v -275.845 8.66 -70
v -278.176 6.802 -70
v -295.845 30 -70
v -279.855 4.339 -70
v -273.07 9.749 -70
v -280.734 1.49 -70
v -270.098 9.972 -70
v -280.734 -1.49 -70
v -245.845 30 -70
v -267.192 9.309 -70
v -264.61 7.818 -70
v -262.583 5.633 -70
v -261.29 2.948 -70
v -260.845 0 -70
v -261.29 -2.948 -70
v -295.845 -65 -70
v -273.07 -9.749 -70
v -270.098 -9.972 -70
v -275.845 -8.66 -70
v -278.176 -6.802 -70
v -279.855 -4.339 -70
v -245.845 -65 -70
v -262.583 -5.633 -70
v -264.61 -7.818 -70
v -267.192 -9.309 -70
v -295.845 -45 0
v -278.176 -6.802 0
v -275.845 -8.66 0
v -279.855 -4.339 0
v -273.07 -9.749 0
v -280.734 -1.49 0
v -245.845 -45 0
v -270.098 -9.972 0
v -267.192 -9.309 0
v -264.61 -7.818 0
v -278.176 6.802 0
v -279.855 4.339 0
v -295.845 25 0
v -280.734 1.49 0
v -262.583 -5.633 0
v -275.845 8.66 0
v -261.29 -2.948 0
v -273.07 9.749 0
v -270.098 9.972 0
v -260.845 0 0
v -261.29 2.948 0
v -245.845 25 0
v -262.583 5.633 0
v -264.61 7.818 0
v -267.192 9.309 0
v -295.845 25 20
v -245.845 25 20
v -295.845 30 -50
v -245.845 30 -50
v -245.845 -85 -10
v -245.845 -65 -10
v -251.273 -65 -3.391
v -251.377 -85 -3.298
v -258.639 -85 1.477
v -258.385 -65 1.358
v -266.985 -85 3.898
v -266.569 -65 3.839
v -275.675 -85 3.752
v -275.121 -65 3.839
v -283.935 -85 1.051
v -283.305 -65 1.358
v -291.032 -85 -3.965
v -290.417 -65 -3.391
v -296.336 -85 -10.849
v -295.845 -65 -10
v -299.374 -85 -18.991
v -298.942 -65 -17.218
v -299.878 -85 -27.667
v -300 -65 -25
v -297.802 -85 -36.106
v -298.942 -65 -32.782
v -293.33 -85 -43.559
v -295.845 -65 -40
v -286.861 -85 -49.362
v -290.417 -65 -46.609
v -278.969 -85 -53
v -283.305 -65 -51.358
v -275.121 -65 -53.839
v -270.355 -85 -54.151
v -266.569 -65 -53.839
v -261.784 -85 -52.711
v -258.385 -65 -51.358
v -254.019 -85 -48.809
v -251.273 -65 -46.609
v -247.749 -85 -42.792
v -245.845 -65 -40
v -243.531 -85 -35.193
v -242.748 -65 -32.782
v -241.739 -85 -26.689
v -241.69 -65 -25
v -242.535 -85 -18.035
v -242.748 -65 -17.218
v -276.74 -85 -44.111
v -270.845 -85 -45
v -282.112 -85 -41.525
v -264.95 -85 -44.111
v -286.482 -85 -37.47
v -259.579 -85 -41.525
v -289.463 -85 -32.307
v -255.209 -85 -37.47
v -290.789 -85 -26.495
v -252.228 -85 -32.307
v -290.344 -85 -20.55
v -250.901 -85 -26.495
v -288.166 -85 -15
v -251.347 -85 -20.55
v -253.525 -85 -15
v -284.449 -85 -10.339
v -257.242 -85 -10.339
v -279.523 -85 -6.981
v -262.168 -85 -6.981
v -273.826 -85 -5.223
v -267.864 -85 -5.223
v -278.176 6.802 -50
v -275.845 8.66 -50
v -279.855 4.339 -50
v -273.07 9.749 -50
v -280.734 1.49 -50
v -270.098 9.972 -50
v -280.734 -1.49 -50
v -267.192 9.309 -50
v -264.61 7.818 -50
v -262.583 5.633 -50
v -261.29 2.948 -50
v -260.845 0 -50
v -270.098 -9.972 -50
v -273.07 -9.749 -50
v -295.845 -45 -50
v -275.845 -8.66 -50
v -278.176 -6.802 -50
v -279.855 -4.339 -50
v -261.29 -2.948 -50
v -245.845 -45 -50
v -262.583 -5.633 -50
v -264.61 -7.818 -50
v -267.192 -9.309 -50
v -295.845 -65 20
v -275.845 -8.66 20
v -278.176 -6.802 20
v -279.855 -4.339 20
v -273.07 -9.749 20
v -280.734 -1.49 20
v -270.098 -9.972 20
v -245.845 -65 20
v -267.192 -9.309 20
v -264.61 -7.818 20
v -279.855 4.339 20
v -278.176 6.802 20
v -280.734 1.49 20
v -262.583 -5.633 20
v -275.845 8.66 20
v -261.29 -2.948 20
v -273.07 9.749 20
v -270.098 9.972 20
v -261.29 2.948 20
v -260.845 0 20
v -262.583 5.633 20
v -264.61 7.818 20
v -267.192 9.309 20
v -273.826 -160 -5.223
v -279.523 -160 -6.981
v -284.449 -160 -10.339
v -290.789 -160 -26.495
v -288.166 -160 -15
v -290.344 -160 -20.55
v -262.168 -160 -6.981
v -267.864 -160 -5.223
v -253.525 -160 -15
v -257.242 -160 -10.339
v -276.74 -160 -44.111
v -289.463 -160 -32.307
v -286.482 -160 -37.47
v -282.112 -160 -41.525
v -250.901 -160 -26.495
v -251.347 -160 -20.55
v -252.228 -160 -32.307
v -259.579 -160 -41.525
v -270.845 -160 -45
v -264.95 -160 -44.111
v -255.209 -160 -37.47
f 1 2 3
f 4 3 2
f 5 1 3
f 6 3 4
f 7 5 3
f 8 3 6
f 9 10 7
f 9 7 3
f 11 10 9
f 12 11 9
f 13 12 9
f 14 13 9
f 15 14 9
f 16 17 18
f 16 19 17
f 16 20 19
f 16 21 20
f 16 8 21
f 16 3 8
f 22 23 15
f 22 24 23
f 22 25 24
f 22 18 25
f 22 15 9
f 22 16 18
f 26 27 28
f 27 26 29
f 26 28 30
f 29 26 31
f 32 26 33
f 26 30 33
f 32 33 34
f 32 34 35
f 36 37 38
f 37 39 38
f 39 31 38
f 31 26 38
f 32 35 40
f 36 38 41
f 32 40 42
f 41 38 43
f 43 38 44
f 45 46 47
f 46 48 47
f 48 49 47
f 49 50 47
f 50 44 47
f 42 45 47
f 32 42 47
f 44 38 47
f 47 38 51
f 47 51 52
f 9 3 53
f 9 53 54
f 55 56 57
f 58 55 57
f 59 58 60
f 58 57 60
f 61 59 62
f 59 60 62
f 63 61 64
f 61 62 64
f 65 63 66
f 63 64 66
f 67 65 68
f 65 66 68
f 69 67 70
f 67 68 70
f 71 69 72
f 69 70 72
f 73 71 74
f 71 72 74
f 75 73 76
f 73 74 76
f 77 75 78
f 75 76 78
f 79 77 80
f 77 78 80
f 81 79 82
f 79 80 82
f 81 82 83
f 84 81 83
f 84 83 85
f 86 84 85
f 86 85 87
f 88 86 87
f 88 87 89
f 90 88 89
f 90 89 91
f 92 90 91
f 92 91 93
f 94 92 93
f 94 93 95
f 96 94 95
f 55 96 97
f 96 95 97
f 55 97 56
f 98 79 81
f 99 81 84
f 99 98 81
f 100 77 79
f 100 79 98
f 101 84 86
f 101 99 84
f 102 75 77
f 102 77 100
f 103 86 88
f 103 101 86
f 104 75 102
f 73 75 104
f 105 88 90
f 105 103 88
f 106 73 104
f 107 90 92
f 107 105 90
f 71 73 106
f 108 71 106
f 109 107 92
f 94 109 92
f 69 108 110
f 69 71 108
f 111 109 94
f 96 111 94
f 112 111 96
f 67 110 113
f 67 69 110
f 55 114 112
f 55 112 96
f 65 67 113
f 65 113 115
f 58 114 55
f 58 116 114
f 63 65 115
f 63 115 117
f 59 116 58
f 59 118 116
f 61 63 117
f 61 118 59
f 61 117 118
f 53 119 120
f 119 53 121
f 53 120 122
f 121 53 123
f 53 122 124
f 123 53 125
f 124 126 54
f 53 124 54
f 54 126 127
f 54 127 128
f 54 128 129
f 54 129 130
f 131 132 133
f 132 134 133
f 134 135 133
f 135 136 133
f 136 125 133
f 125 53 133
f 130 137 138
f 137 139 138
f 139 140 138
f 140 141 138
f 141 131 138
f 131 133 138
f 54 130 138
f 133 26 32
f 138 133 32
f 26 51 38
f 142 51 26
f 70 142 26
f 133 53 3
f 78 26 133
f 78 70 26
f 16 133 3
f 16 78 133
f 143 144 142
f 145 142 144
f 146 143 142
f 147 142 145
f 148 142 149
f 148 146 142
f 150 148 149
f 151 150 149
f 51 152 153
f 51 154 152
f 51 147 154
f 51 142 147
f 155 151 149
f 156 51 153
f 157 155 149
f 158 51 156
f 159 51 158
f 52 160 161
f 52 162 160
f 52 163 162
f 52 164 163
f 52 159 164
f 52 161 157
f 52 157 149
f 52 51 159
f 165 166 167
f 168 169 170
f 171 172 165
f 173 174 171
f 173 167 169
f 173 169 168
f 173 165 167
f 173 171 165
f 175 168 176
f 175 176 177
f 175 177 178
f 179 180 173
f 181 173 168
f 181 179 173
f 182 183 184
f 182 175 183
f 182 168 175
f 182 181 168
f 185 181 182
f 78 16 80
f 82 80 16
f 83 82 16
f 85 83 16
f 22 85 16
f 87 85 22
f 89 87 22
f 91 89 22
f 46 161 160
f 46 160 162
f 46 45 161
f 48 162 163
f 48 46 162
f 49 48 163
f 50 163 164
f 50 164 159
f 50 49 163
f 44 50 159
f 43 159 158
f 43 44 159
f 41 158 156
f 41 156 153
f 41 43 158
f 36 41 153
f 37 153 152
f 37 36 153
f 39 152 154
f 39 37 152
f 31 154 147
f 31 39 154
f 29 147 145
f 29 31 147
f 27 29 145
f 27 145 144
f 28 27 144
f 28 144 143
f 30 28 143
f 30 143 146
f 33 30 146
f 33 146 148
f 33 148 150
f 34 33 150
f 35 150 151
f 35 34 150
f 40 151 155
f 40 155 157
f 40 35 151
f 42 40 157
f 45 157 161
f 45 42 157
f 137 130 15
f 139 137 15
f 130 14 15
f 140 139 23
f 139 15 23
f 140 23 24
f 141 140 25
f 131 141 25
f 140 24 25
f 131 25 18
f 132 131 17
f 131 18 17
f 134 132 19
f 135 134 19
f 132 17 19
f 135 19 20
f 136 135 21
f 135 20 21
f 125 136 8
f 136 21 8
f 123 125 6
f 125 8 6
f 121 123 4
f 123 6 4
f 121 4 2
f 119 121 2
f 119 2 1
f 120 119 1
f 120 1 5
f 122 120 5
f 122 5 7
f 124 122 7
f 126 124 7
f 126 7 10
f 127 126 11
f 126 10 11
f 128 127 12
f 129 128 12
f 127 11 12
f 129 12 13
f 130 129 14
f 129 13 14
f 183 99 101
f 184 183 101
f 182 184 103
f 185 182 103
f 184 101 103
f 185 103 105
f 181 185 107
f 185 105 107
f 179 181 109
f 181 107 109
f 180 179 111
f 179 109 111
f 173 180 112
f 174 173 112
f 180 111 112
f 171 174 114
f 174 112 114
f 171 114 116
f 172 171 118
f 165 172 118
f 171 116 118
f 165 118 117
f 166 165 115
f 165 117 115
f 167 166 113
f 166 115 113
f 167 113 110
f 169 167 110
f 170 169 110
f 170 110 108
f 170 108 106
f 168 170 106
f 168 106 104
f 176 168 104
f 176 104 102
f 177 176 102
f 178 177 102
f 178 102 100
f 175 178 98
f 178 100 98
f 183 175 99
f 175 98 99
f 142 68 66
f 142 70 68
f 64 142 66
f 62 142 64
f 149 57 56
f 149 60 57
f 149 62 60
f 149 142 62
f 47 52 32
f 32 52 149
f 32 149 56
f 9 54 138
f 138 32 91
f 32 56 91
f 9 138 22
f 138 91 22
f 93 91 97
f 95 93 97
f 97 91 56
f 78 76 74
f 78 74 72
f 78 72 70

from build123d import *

# Parameters (mm, degrees)
ESQUISSE1_W             = 50
ESQUISSE1_H             = 70
ESQUISSE1_R             = 10
BOSS_EXTRU_1_DEPTH      = 20
ESQUISSE2_W             = 50
ESQUISSE2_H             = 90
BOSS_EXTRU_2_DEPTH      = 20
ESQUISSE3_R             = 29.154759474
BOSS_EXTRU_3_DEPTH      = 20
ESQUISSE4_R             = 20
BOSS_EXTRU_4_DEPTH      = 75
ESQUISSE5_W             = 50
ESQUISSE5_H             = 20
BOSS_EXTRU_5_DEPTH      = 75
ESQUISSE6_R             = 10
ENL_V_MAT_EXTRU_1_DEPTH = 75


with BuildPart() as part:
    # Esquisse1 → Boss.-Extru.1 (new body)
    with BuildSketch(Plane.XY):
        with Locations((-270.845240526, -10)):
            Rectangle(ESQUISSE1_W, ESQUISSE1_H)
        with Locations((-270.845240526, 0)):
            Circle(ESQUISSE1_R, mode=Mode.SUBTRACT)
    extrude(amount=BOSS_EXTRU_1_DEPTH)

    # Esquisse2 → Boss.-Extru.2 (add)
    with BuildSketch(Plane.XZ.offset(45)):
        with Locations((-270.845240526, -25)):
            Rectangle(ESQUISSE2_W, ESQUISSE2_H)
    extrude(amount=BOSS_EXTRU_2_DEPTH)

    # Esquisse3 → Boss.-Extru.3 (add)
    with BuildSketch(Plane.XZ.offset(65)):
        with Locations(Location((-270.845240526, -25, 0), (0, 0, 30.963756532))):
            Circle(ESQUISSE3_R)
    extrude(amount=BOSS_EXTRU_3_DEPTH)

    # Esquisse4 → Boss.-Extru.4 (add)
    with BuildSketch(Plane.XZ.offset(85)):
        with Locations(Location((-270.845240526, -25, 0), (0, 0, 270))):
            Circle(ESQUISSE4_R)
    extrude(amount=BOSS_EXTRU_4_DEPTH)

    # Esquisse5 → Boss.-Extru.5 (add)
    with BuildSketch(Plane(origin=(0, -45, 0), x_dir=(1, 0, 0), z_dir=(0, 1, 0))):
        with Locations((-270.845240526, 60)):
            Rectangle(ESQUISSE5_W, ESQUISSE5_H)
    extrude(amount=BOSS_EXTRU_5_DEPTH)

    # Esquisse6 → Enlèv. mat.-Extru.1 (cut)
    with BuildSketch(Plane(origin=(0, 0, -70), x_dir=(-1, 0, 0), z_dir=(0, 0, -1))):
        with Locations(Location((270.845240526, 0, 0), (0, 0, 180))):
            Circle(ESQUISSE6_R)
    extrude(amount=-ENL_V_MAT_EXTRU_1_DEPTH, mode=Mode.SUBTRACT)


solid = part.part
